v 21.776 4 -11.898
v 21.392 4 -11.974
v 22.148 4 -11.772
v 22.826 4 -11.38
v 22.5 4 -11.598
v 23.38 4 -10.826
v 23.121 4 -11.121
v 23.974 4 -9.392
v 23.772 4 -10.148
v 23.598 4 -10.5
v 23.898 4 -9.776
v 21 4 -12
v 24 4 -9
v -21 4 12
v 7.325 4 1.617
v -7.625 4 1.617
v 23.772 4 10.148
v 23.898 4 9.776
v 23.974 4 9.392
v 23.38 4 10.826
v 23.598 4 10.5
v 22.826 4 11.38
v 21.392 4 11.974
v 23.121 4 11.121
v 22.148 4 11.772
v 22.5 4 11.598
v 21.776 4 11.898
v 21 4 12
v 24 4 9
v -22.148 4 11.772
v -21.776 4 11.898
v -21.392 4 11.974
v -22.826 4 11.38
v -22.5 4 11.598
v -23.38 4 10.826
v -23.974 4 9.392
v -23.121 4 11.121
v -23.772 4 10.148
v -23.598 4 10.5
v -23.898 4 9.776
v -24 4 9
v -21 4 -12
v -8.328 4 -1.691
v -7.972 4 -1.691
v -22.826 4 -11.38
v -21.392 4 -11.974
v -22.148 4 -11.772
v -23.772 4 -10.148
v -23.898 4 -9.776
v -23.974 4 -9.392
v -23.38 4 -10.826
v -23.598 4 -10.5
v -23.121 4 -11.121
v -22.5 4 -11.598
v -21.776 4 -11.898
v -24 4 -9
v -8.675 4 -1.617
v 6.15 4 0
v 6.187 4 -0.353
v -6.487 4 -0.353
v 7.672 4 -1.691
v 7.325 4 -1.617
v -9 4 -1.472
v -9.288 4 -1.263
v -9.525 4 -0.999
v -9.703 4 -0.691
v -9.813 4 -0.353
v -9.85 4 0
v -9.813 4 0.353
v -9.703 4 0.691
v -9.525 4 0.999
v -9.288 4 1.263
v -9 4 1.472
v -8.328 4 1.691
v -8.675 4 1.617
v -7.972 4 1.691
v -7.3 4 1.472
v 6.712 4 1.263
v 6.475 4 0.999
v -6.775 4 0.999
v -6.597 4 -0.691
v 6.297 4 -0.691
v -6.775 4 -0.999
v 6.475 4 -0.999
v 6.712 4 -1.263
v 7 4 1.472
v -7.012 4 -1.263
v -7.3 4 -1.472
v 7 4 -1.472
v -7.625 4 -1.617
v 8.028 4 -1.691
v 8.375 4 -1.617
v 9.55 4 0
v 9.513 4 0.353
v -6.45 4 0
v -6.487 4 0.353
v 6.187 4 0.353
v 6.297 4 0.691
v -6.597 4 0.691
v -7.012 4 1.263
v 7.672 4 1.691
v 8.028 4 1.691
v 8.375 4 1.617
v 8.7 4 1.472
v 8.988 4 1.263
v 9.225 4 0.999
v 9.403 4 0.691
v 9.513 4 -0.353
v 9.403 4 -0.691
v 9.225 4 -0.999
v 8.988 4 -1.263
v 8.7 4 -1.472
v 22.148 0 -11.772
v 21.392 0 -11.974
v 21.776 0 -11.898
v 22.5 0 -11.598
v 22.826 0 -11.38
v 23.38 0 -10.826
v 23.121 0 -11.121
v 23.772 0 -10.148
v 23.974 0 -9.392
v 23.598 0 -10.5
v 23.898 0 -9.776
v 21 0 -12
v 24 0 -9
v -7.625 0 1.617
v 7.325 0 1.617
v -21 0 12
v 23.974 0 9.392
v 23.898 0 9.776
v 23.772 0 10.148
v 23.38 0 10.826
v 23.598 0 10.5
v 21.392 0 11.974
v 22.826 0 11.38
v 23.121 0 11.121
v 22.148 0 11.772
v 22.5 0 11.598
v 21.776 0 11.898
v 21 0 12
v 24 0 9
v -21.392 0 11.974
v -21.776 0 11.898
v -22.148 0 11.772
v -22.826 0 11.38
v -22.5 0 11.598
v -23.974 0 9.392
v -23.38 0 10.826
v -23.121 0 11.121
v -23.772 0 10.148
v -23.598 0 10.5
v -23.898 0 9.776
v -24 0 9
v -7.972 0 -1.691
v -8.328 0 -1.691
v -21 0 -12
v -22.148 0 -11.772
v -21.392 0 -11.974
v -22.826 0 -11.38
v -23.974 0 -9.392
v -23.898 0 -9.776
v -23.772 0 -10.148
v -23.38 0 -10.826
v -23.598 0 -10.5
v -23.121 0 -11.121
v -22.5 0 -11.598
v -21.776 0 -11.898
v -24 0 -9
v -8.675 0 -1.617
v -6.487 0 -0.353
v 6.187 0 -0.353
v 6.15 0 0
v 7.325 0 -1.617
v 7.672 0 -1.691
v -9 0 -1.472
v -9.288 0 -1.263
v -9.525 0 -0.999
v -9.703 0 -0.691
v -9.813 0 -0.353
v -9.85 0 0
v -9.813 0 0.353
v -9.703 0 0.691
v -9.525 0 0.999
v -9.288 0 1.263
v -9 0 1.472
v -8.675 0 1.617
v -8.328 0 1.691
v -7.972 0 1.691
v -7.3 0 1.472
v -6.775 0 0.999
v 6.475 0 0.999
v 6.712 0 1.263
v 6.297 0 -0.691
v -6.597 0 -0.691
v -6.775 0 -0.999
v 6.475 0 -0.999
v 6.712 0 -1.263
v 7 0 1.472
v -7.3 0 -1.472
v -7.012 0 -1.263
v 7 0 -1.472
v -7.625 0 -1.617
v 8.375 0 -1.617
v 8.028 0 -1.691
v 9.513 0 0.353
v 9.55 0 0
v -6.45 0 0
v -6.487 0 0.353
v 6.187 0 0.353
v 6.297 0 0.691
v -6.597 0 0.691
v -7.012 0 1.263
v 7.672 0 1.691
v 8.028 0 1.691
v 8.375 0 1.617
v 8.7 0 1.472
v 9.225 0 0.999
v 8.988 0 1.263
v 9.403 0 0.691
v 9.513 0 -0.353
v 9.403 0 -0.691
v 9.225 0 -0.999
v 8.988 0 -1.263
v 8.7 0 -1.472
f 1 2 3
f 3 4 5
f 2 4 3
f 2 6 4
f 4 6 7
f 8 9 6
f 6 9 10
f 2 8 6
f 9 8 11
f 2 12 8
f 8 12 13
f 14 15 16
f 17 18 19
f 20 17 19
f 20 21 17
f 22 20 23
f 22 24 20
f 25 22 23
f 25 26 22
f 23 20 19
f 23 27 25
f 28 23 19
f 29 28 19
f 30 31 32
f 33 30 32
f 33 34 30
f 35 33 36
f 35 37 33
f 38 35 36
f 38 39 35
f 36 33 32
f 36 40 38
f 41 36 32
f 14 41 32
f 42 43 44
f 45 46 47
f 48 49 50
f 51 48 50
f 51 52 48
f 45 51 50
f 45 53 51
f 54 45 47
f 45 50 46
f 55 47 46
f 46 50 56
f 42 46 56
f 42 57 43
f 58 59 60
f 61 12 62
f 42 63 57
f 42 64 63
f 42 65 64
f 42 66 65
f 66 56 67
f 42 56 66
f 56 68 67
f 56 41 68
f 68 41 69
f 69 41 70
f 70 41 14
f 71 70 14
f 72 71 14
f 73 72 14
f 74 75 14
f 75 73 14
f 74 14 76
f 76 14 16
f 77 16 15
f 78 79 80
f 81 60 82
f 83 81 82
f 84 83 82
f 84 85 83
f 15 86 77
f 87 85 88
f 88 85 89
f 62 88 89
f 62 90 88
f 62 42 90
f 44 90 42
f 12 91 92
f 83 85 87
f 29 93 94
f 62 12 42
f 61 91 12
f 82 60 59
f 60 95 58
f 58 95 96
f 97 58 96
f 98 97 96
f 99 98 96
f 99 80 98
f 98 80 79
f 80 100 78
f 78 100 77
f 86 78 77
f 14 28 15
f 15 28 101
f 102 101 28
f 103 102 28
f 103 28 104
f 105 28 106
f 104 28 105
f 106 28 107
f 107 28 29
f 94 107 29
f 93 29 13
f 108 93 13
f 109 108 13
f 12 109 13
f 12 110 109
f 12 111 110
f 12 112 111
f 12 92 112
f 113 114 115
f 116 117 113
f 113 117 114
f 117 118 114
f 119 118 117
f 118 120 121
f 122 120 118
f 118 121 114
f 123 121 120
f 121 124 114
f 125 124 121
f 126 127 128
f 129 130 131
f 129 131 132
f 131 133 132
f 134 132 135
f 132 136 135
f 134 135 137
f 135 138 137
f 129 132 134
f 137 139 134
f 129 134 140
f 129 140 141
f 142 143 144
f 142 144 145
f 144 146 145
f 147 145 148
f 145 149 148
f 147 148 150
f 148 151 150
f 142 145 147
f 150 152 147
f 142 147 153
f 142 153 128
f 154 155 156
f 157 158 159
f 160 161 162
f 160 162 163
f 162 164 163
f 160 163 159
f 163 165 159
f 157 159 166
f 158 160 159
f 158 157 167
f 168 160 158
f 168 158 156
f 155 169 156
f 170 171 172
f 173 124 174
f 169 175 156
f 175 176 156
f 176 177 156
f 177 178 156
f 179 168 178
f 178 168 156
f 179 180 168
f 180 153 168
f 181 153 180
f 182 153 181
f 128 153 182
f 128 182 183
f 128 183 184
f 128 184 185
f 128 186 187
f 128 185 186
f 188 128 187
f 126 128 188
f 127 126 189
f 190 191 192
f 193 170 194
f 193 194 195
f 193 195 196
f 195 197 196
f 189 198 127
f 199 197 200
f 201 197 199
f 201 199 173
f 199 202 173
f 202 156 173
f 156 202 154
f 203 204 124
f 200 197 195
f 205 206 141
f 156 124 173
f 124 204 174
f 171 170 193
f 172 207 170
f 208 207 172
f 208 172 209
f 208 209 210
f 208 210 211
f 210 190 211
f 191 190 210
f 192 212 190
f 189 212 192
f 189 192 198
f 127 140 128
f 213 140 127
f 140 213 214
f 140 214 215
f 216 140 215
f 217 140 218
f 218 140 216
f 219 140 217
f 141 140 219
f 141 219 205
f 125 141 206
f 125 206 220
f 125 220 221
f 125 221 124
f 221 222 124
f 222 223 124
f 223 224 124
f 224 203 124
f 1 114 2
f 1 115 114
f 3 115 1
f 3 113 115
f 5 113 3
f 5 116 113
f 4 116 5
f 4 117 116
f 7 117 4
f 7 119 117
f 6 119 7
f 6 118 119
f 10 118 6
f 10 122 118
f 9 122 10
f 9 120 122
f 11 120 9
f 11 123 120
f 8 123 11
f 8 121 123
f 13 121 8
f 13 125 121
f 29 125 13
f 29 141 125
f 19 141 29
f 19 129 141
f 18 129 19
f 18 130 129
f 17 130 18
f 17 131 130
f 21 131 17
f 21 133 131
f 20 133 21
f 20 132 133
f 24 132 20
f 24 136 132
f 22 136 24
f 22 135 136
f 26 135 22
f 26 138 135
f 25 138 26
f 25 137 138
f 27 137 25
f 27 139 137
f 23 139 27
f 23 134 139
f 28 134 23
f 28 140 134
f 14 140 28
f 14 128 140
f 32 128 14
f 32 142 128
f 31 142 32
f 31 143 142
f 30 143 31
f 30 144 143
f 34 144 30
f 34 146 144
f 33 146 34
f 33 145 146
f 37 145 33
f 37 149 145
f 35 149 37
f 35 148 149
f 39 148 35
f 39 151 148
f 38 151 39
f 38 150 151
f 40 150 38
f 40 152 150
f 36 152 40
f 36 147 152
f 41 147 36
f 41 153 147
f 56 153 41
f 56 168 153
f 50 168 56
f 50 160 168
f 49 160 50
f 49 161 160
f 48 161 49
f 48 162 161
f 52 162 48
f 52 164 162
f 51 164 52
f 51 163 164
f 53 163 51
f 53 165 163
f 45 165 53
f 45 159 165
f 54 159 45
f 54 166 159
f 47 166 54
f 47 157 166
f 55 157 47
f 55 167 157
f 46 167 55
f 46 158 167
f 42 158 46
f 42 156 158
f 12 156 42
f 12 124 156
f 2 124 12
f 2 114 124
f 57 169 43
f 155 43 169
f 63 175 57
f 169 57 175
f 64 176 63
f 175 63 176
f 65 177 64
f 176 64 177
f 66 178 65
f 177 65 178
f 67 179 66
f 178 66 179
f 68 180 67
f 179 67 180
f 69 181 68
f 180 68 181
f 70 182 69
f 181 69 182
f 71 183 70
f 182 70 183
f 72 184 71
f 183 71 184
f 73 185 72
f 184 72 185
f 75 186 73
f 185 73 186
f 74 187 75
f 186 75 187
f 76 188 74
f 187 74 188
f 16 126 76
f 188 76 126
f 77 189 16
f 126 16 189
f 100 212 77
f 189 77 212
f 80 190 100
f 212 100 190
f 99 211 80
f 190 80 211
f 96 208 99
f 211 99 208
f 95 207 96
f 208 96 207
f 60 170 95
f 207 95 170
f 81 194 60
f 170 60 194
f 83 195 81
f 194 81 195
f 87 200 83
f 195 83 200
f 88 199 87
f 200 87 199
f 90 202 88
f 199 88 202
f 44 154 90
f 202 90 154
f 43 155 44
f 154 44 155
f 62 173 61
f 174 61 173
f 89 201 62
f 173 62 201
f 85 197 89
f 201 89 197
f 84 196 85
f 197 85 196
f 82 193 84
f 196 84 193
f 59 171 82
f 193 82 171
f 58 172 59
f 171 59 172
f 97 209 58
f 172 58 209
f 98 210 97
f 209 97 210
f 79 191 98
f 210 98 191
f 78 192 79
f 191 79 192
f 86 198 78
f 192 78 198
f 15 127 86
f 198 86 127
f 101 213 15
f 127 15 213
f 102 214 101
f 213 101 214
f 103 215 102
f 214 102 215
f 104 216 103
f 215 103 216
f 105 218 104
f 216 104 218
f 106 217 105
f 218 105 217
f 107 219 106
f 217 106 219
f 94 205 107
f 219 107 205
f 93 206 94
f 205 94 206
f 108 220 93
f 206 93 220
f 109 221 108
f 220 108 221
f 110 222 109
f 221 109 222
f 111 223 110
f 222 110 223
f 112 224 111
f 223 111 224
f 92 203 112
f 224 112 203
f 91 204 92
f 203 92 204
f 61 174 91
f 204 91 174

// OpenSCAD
// HUB75 display frame - V1.2 middle seam coupler
//
// Self-contained component.
// No project_config.scad dependency.

/* [Plate] */
plate_width = 48.0;
plate_height = 24.0;
plate_thickness = 4.0;
corner_radius = 3.0;

/* [Mounting holes] */
left_hole_x = -8.15;
right_hole_x = 7.85;
hole_diameter = 3.4;

/* [Preview] */
preview_color = [0.62, 0.04, 0.03, 1];

/* [Resolution] */
$fn = 48;


module rounded_rectangle_2d(width, height, radius) {
    offset(r=radius)
        square(
            [width - 2*radius, height - 2*radius],
            center=true
        );
}


module middle_seam_coupler(
    width = plate_width,
    height = plate_height,
    thickness = plate_thickness,
    radius = corner_radius,
    left_hole_x_value = left_hole_x,
    right_hole_x_value = right_hole_x,
    hole_diameter_value = hole_diameter,
    part_color = preview_color
) {
    color(part_color)
        translate([0, thickness, 0])
            rotate([90, 0, 0])
                linear_extrude(height=thickness)
                    difference() {
                        rounded_rectangle_2d(
                            width,
                            height,
                            radius
                        );

                        translate([left_hole_x_value, 0])
                            circle(
                                d=hole_diameter_value,
                                $fn=30
                            );

                        translate([right_hole_x_value, 0])
                            circle(
                                d=hole_diameter_value,
                                $fn=30
                            );
                    }
}


// Standalone preview
middle_seam_coupler();
